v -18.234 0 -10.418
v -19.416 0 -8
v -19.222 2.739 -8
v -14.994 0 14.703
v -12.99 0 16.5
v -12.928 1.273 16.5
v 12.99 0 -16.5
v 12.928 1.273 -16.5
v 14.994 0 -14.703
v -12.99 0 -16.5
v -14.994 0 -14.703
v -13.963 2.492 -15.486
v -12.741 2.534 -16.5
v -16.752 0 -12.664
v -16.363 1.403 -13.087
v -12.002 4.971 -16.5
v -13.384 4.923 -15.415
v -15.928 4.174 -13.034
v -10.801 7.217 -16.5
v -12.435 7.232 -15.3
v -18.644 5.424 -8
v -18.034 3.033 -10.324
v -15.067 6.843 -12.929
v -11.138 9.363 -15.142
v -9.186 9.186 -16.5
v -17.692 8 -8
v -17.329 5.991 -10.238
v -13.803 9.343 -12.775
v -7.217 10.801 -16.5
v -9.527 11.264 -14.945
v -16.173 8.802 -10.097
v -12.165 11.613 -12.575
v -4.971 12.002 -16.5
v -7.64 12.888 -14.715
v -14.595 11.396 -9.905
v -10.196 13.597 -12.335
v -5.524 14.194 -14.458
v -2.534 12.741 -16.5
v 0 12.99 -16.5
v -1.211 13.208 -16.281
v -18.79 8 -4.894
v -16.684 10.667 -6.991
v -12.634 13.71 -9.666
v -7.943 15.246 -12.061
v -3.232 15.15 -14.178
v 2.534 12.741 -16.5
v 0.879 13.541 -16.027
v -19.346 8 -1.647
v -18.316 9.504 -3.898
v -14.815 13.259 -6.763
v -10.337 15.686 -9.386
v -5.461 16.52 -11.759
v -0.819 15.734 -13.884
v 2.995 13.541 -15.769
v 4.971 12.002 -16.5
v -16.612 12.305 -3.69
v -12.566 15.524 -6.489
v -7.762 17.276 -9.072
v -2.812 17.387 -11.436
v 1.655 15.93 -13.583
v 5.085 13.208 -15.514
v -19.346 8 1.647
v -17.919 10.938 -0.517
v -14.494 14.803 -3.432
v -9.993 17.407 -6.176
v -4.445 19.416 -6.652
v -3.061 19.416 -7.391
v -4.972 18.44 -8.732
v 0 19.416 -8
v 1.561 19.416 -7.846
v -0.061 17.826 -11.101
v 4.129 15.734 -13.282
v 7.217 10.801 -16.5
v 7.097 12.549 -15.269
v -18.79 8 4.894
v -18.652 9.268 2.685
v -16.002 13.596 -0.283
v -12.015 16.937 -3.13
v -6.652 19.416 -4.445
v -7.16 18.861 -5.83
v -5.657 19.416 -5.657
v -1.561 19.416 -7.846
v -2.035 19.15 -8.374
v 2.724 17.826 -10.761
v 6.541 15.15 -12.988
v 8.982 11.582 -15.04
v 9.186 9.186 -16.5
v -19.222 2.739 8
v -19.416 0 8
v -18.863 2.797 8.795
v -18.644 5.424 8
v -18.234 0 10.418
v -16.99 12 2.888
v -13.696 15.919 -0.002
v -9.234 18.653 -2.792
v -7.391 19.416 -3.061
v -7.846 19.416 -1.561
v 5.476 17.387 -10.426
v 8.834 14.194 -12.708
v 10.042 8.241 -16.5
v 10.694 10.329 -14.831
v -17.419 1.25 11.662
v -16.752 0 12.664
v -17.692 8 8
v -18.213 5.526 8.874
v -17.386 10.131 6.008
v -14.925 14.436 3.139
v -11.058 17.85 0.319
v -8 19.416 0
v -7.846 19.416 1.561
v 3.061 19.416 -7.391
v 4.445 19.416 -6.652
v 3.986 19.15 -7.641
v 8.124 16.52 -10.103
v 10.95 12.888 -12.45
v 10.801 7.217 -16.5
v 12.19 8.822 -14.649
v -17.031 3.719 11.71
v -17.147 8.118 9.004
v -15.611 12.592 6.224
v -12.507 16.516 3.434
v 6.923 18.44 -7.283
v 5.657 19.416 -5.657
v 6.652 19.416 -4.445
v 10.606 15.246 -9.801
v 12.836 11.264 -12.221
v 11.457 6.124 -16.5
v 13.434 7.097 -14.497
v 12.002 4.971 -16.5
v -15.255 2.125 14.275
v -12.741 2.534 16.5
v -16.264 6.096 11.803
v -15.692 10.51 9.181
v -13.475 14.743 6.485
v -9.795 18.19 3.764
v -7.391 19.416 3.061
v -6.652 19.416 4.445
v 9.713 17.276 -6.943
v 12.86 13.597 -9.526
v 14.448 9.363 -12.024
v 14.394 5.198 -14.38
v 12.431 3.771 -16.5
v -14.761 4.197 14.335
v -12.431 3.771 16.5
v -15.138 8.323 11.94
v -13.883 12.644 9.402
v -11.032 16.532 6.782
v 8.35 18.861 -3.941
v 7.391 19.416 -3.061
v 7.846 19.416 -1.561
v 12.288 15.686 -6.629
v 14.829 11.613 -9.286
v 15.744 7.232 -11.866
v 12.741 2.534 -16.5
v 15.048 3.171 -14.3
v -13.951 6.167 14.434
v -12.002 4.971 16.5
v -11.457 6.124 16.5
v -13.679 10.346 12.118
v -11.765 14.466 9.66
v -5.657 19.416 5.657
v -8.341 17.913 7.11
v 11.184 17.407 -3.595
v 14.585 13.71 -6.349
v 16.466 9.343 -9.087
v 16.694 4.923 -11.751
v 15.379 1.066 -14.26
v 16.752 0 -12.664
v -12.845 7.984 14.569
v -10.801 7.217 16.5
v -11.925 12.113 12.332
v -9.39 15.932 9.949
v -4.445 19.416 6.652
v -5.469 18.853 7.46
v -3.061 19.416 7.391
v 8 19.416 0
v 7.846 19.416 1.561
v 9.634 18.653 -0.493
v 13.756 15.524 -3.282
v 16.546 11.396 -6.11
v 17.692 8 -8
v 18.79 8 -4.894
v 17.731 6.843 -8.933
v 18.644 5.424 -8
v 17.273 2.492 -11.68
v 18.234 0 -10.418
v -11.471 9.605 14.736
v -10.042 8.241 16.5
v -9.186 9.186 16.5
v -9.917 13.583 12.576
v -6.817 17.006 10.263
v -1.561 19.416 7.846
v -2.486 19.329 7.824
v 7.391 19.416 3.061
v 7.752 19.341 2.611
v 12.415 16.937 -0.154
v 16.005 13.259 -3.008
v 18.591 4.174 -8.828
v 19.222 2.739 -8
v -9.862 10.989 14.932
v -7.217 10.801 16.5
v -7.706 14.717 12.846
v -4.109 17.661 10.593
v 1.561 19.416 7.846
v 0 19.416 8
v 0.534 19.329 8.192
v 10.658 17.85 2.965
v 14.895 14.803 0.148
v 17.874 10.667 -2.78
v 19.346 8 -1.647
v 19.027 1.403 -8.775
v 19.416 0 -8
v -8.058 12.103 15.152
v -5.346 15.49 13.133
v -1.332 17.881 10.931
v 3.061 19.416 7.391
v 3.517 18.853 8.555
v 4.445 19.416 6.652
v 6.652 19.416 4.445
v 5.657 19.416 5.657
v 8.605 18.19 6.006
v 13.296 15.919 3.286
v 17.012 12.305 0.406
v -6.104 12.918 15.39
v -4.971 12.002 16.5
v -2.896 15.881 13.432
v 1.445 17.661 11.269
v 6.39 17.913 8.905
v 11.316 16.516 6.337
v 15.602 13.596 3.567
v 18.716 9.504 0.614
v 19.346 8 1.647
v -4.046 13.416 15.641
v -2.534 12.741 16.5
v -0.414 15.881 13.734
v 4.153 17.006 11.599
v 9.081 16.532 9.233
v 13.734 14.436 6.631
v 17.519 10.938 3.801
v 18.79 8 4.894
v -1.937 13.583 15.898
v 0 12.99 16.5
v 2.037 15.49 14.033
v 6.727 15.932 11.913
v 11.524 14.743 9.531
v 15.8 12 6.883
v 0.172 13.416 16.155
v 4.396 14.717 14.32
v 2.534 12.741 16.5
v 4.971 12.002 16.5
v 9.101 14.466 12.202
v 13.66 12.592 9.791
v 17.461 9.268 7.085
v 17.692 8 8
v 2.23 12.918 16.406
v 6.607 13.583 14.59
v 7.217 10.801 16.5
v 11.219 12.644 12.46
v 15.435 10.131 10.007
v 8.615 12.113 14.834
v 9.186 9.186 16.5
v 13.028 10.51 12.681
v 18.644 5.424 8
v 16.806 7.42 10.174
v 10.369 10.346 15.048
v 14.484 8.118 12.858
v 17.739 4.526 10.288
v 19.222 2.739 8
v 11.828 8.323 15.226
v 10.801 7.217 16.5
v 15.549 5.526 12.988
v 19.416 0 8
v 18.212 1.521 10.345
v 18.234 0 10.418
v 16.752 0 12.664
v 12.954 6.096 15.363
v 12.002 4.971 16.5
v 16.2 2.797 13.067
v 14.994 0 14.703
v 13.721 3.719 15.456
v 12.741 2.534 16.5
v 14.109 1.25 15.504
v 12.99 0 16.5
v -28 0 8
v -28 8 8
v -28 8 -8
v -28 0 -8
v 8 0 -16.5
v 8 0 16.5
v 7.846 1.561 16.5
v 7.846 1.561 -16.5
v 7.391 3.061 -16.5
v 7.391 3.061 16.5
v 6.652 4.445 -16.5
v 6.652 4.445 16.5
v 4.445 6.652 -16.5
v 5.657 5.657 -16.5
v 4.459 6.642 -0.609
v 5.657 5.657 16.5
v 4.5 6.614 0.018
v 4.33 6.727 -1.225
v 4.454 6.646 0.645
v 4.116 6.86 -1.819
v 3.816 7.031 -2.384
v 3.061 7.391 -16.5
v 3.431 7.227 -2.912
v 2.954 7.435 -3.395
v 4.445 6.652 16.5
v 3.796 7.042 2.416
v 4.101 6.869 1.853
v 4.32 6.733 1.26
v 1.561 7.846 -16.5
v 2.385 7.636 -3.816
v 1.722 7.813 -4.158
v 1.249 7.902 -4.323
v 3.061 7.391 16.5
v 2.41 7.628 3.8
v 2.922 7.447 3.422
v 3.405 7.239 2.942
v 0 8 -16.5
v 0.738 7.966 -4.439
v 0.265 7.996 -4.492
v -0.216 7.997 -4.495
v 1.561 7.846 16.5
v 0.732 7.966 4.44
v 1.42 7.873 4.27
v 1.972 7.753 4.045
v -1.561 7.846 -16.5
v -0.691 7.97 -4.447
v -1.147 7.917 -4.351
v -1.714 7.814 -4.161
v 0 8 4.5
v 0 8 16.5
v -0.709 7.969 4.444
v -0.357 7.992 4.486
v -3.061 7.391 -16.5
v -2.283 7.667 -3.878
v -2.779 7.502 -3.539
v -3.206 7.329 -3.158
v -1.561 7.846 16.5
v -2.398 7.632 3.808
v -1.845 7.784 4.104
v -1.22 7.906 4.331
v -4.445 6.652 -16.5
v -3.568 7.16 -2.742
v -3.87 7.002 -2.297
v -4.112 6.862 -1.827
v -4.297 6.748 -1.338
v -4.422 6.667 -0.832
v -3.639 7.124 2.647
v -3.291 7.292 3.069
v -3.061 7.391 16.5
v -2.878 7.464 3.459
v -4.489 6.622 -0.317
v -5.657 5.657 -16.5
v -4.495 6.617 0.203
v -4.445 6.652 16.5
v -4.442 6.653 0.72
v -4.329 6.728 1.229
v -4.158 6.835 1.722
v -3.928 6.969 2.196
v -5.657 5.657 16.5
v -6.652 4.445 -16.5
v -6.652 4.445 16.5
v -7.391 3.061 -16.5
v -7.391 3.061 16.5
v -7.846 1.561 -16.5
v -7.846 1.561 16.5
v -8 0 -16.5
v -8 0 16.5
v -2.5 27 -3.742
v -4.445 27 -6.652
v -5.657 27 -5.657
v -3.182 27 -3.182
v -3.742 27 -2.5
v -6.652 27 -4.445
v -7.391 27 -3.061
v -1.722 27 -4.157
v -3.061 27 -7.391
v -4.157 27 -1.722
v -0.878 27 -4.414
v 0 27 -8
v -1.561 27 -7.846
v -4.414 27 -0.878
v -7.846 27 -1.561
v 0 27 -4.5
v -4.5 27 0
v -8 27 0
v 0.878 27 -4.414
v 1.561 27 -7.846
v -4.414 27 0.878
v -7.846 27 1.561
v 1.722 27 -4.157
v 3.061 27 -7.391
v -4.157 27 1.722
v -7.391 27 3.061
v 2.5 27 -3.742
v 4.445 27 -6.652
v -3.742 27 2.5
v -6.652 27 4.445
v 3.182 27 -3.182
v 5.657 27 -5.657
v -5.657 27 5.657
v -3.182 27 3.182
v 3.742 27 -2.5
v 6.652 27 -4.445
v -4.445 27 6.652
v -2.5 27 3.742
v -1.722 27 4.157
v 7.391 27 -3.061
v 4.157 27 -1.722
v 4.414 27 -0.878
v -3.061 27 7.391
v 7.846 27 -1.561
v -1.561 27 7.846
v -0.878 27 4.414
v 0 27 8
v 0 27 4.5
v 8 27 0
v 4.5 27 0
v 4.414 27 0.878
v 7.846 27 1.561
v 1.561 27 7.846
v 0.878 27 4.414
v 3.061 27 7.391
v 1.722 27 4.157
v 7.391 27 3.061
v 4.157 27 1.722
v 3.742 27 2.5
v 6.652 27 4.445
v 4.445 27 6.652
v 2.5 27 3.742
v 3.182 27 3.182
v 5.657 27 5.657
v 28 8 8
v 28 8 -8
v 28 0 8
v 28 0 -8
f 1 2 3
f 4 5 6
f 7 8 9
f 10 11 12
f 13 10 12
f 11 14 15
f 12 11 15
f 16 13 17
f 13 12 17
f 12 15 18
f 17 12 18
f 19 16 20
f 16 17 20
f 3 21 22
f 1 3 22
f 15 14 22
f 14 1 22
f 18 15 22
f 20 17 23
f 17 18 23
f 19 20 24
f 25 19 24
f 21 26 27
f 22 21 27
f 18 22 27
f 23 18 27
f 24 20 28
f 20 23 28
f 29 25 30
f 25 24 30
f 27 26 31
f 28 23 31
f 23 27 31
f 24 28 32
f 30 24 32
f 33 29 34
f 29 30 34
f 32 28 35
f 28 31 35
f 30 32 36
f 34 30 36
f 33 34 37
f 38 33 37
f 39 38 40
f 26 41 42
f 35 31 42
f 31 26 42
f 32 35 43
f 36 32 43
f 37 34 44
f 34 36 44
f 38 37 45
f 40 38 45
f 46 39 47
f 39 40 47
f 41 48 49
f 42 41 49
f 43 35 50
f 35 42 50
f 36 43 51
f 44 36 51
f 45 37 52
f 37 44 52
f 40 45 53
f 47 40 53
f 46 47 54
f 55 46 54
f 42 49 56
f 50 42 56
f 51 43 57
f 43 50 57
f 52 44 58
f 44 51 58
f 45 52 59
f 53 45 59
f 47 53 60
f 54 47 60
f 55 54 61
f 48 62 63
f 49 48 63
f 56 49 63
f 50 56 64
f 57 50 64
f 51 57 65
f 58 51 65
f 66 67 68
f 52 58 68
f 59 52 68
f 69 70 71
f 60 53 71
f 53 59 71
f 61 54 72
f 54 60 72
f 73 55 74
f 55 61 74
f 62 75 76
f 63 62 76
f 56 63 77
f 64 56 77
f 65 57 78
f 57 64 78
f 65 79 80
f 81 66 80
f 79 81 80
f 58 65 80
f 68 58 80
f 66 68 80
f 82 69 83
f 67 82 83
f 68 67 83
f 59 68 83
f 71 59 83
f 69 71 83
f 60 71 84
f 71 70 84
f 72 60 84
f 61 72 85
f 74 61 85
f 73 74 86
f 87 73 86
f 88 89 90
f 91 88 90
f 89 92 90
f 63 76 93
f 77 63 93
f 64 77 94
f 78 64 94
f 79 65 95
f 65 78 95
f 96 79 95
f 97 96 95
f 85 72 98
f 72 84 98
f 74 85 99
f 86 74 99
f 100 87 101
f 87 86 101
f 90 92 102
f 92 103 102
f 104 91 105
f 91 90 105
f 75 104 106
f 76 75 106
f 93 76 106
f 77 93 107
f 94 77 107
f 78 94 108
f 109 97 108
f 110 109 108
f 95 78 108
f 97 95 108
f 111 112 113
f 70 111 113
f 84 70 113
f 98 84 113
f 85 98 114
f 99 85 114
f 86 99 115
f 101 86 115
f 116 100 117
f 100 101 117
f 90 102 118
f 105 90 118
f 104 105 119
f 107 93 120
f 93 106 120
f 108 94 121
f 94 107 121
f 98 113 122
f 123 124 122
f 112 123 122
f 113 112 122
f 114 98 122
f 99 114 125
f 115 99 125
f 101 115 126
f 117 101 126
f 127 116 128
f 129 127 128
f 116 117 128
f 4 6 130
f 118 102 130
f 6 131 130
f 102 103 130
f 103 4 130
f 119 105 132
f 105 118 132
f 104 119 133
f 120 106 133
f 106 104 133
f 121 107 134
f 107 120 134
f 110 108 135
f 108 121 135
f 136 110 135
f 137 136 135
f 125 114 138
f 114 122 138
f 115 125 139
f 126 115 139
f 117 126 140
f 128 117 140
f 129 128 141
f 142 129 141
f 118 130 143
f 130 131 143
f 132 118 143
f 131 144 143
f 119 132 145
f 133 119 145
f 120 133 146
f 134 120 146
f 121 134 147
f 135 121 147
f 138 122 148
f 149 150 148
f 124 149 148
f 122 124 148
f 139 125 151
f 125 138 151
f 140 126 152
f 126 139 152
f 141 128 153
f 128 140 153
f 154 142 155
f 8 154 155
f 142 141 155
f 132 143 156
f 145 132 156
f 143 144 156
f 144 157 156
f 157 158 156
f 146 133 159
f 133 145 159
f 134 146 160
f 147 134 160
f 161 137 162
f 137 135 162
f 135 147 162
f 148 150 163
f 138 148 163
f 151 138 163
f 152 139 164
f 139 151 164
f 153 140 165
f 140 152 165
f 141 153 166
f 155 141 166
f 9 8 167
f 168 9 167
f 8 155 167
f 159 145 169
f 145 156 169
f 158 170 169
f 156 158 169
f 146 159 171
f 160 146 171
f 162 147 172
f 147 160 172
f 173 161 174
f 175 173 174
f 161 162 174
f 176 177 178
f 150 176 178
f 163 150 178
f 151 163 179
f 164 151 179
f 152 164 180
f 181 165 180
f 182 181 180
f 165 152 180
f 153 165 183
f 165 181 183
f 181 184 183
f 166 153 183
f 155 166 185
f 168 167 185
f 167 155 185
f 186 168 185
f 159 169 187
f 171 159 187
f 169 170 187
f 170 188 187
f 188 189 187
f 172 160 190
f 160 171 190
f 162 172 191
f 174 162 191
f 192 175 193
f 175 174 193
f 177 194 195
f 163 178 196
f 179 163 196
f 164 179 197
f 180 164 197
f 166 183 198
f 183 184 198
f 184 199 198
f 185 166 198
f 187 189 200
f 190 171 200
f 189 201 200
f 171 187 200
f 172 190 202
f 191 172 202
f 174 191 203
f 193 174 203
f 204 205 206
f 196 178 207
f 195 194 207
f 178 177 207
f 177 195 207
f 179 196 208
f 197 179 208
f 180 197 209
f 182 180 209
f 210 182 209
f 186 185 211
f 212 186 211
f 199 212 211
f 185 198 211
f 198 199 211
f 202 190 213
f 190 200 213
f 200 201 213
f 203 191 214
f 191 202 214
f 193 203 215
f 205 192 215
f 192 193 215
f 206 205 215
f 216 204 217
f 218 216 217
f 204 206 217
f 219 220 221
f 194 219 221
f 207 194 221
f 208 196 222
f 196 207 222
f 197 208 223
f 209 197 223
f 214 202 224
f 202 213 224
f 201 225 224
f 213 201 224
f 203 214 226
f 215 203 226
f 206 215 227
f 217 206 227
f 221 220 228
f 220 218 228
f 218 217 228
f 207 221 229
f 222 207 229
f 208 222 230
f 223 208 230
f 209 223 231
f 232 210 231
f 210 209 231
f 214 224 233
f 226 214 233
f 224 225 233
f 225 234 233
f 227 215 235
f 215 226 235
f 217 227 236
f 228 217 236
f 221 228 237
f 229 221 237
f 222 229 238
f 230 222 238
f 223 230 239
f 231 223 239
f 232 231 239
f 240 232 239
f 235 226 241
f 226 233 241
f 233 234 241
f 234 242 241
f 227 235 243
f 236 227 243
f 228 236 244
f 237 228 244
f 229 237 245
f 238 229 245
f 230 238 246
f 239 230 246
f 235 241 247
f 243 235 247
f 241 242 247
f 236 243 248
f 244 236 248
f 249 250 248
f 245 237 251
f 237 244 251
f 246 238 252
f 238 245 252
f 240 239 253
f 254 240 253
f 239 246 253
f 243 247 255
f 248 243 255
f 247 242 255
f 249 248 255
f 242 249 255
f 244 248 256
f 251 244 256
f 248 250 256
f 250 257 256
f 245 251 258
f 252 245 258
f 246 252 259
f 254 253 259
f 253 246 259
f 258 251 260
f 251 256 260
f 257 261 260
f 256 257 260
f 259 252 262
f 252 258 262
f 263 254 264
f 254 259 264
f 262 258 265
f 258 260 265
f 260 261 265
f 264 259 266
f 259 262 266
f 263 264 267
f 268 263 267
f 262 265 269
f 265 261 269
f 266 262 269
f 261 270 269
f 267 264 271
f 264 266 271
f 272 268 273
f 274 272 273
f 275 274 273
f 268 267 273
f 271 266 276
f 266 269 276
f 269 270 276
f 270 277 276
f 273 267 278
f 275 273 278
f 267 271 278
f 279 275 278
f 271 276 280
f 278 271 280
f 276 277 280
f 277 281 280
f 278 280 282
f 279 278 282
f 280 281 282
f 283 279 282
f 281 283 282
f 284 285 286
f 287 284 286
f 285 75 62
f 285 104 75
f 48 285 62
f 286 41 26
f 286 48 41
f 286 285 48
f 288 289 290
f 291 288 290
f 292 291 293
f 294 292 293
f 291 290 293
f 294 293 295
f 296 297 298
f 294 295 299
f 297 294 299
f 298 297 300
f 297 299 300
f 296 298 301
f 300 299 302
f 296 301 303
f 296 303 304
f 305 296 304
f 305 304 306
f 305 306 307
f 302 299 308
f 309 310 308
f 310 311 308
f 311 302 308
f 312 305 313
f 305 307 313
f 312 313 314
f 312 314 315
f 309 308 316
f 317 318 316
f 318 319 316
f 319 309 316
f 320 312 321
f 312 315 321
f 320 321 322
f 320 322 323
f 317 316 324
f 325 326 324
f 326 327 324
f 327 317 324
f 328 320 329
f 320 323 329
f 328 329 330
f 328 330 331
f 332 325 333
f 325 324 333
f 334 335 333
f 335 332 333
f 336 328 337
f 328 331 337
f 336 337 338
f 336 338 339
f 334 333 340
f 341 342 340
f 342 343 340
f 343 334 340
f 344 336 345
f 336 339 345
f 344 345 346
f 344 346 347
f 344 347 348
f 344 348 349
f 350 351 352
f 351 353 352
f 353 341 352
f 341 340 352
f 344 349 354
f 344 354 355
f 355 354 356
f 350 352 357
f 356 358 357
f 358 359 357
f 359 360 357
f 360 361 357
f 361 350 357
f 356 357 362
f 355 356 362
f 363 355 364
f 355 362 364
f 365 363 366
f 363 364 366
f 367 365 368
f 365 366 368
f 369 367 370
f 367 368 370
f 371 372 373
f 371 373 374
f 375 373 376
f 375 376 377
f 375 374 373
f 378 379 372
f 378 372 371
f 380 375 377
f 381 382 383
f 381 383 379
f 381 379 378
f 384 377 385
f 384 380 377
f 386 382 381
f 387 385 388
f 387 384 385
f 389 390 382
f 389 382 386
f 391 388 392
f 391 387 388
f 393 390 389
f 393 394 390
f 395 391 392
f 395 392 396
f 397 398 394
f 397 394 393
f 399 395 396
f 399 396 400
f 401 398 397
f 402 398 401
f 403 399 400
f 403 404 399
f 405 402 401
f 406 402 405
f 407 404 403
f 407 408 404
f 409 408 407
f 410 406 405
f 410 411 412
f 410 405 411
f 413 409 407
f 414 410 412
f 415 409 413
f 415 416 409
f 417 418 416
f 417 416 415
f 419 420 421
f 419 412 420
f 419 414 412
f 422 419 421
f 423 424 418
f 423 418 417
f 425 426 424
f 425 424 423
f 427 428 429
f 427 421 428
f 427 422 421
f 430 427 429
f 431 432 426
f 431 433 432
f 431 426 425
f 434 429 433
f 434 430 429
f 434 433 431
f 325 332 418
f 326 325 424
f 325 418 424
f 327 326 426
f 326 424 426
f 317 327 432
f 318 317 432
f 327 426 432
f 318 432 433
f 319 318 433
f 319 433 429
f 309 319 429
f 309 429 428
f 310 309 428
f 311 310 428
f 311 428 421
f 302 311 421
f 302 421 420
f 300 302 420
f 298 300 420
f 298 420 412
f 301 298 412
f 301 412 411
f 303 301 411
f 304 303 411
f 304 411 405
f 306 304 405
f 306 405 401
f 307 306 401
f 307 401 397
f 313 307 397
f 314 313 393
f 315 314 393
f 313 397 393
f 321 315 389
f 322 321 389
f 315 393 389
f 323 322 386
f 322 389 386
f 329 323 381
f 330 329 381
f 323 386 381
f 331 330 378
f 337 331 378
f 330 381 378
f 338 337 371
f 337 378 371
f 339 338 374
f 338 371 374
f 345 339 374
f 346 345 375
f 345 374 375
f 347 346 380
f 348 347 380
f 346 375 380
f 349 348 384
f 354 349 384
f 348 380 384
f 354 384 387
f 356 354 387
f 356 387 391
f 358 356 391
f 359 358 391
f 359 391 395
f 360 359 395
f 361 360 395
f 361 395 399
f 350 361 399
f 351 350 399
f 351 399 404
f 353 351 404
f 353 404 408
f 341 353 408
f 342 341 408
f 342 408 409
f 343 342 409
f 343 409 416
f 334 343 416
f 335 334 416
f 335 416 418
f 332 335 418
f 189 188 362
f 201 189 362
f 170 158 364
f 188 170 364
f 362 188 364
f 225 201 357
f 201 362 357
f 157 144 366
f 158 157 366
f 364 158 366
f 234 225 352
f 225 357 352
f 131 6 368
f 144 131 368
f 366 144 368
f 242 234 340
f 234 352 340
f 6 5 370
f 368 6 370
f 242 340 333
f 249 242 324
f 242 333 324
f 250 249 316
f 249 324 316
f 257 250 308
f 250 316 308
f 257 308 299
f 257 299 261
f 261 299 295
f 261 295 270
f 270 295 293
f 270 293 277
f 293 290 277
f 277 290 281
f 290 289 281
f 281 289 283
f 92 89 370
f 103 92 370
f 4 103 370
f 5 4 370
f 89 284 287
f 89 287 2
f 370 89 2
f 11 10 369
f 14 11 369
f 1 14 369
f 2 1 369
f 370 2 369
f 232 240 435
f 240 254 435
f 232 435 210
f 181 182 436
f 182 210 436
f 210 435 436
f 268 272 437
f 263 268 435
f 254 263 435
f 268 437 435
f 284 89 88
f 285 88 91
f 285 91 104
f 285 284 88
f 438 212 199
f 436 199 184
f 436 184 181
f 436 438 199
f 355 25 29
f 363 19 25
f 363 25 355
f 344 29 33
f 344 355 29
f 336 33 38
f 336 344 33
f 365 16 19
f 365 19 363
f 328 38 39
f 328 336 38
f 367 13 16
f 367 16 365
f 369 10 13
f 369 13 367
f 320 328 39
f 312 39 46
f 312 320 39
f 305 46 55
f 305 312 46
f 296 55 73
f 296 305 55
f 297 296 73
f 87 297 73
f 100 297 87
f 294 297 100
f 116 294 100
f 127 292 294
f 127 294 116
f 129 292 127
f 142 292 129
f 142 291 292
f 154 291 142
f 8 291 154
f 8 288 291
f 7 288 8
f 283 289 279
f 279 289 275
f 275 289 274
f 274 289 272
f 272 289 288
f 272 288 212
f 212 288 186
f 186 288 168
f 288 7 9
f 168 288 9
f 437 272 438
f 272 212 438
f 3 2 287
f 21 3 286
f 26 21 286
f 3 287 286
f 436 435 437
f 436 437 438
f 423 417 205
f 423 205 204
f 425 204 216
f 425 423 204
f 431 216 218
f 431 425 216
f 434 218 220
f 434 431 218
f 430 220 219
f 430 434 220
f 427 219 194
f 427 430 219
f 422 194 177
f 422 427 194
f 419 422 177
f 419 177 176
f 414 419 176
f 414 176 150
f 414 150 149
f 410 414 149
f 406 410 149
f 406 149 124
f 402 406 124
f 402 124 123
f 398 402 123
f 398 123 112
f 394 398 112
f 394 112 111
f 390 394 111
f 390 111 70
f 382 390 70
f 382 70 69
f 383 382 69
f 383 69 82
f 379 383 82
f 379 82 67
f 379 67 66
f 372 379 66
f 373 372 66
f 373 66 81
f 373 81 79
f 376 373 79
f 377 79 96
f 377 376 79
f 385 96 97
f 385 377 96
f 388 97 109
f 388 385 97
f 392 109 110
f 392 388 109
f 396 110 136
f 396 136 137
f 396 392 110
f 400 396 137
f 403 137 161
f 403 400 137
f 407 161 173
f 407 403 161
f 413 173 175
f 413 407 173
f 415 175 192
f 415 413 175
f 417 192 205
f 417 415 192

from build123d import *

# Parameters (mm, degrees)
REVOLVE_2_ANGLE         = 180
EXTRUDE_1_REACH         = 59.297
EXTRUDE_1_END_RADIUS    = 21
SKETCH_3_W              = 16
SKETCH_3_H              = 8
EXTRUDE_2_REACH         = 46.204
EXTRUDE_2_END_RADIUS    = 21
SKETCH_6_R              = 8
SKETCH_7_R              = 4.5
CUT_EXTRUDE_1_DEPTH     = 45.204072223
SKETCH_8_R              = 8
CUT_EXTRUDE_2_DEPTH     = 2500
CUT_EXTRUDE_START       = -27
CUT_EXTRUDE_3_OUTLINE_W = 28
CUT_EXTRUDE_3_OUTLINE_H = 4.5
CUT_EXTRUDE_3_DEPTH     = 12.990381057


# Read off the part's stored shape, not the designer's step: 切除-拉伸3
with BuildPart() as part:
    # 草图2 → 旋转2 (revolve)
    with BuildSketch(Plane(origin=(0, 0, 0), x_dir=(1, 0, 0), z_dir=(0, 1, 0))):
        with BuildLine():
            Line((-2.539892785, -20.845837586), (2.539892785, 20.845837586))
            ThreePointArc((2.539892785, 20.845837586), (-20.845837586, 2.539892785), (-2.539892785, -20.845837586))
        make_face()
    revolve(axis=Axis((-2.539892785, 0, 20.845837586), (0.12094727545633621, 0, -0.9926589326448885)), revolution_arc=REVOLVE_2_ANGLE)

    # 凸台-拉伸1: up to this sphere (the profile starts outside it)
    extrude_1_end = Location((0, 0, 0)) * Sphere(EXTRUDE_1_END_RADIUS, mode=Mode.PRIVATE)
    # 草图3 → 凸台-拉伸1 (add, up to the surface)
    with BuildSketch(Plane(origin=(28, 0, 0), x_dir=(0, 0, -1), z_dir=(1, 0, 0)), mode=Mode.PRIVATE) as extrude_1_sk1:
        with Locations((0, 4)):
            Rectangle(SKETCH_3_W, SKETCH_3_H)
    extrude_1_tool1 = extrude(extrude_1_sk1.sketch, amount=-EXTRUDE_1_REACH, mode=Mode.PRIVATE) - extrude_1_end
    extrude_1 = extrude_1_tool1.solids().sort_by_distance((28, 4, 0))[0]
    add(extrude_1)

    # 镜向1: 凸台-拉伸1 across plane
    add(extrude_1.mirror(Plane(origin=(0, 0, 0), x_dir=(0, 0, 1), z_dir=(1, 0, 0))))

    # 凸台-拉伸2: up to this sphere (the profile starts outside it)
    extrude_2_end = Location((0, 0, 0)) * Sphere(EXTRUDE_2_END_RADIUS, mode=Mode.PRIVATE)
    # 草图6 → 凸台-拉伸2 (add, up to the surface)
    with BuildSketch(Plane(origin=(0, 27, 0), x_dir=(1, 0, 0), z_dir=(0, 1, 0)), mode=Mode.PRIVATE) as extrude_2_sk1:
        with Locations(Location((0, 0, 0), (0, 0, 270))):
            Circle(SKETCH_6_R)
    extrude_2_tool1 = extrude(extrude_2_sk1.sketch, amount=-EXTRUDE_2_REACH, mode=Mode.PRIVATE) - extrude_2_end
    add(extrude_2_tool1.solids().sort_by_distance((0, 27, 0))[0])

    # 草图7 → 切除-拉伸1 (cut, through all)
    with BuildSketch(Plane(origin=(0, 27, 0), x_dir=(1, 0, 0), z_dir=(0, 1, 0))):
        with Locations(Location((0, 0, 0), (0, 0, 270))):
            Circle(SKETCH_7_R)
    extrude(amount=-CUT_EXTRUDE_1_DEPTH, mode=Mode.SUBTRACT)

    # 草图8 → 切除-拉伸2 (cut, symmetric)
    with BuildSketch(Plane.XY):
        Circle(SKETCH_8_R)
    extrude(amount=CUT_EXTRUDE_2_DEPTH, both=True, mode=Mode.SUBTRACT)

    # 切除-拉伸3 outline → 切除-拉伸3 (cut)
    with BuildSketch(Plane(origin=(0, 27, 0), x_dir=(1, 0, 0), z_dir=(0, 1, 0)).offset(CUT_EXTRUDE_START)):
        with Locations((0, 18.75)):
            Rectangle(CUT_EXTRUDE_3_OUTLINE_W, CUT_EXTRUDE_3_OUTLINE_H)
        with Locations((0, -18.75)):
            Rectangle(CUT_EXTRUDE_3_OUTLINE_W, CUT_EXTRUDE_3_OUTLINE_H)
    extrude(amount=CUT_EXTRUDE_3_DEPTH, mode=Mode.SUBTRACT)


solid = part.part
